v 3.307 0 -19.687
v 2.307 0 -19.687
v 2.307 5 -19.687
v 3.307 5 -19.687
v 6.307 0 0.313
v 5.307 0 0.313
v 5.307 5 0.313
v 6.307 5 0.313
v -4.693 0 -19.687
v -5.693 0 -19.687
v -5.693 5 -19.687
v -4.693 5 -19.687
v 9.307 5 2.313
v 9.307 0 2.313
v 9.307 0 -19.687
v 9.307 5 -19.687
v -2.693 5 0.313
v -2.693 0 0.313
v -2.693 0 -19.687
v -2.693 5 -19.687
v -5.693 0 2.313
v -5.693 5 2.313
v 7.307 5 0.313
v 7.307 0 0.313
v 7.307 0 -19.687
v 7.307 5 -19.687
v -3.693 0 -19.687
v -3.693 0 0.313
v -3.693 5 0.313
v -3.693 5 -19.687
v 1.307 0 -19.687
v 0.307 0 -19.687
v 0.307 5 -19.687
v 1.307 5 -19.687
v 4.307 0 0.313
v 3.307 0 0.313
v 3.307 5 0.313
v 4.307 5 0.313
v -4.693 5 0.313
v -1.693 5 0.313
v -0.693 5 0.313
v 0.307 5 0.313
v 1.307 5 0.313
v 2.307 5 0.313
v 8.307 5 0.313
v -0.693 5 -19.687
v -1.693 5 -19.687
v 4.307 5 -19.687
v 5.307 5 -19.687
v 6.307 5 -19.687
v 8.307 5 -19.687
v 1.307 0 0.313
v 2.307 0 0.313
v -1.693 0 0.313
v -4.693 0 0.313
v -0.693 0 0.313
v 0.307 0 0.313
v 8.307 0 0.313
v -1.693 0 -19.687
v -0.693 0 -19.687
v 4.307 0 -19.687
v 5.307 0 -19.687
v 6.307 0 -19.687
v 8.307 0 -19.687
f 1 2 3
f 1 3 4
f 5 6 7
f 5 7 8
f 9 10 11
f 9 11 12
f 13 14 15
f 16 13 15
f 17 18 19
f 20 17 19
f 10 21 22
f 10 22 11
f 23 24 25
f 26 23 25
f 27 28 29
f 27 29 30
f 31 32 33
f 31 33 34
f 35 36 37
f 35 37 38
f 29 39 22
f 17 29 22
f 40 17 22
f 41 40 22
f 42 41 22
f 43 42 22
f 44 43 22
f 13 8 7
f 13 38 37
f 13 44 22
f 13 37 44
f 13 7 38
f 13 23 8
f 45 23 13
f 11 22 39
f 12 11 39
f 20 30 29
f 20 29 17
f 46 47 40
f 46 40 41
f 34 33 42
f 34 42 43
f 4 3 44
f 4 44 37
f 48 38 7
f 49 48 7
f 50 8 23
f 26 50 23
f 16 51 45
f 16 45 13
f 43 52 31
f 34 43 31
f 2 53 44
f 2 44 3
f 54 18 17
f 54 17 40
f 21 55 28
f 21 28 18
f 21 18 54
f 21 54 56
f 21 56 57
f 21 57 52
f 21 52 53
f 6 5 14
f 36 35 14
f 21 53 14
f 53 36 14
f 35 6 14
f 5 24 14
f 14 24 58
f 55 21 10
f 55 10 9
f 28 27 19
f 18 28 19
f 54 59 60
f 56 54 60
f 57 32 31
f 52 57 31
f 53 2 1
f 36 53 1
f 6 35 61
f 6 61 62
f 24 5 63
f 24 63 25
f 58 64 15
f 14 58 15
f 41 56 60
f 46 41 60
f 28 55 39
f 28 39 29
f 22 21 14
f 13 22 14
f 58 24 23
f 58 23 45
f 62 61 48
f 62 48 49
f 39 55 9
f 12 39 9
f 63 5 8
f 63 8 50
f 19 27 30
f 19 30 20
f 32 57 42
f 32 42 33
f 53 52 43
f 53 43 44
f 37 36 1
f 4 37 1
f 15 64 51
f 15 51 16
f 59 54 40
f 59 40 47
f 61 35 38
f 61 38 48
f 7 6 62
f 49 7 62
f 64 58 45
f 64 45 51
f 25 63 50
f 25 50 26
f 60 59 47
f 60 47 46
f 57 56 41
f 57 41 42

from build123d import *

# Parameters (mm, degrees)
SKETCH1_W           = 15
SKETCH1_H           = 2
BOSS_EXTRUDE1_DEPTH = 5
SKETCH1_3_W         = 1
SKETCH1_3_H         = 20
BOSS_EXTRUDE2_DEPTH = 5
LPATTERN1_COUNT     = 8
LPATTERN1_PITCH     = 2


with BuildPart() as part:
    # Sketch1 → Boss-Extrude1 (new body)
    with BuildSketch(Plane(origin=(0, 0, 0), x_dir=(1, 0, 0), z_dir=(0, 1, 0))):
        with Locations((1.806666667, -1.313333333)):
            Rectangle(SKETCH1_W, SKETCH1_H)
    extrude(amount=BOSS_EXTRUDE1_DEPTH)

    # Sketch1<3> → Boss-Extrude2 (add)
    with BuildSketch(Plane(origin=(0, 0, 0), x_dir=(1, 0, 0), z_dir=(0, 1, 0))):
        with Locations((-5.193333333, 9.686666667)):
            Rectangle(SKETCH1_3_W, SKETCH1_3_H)
    boss_extrude2 = extrude(amount=BOSS_EXTRUDE2_DEPTH)

    # LPattern1: Boss-Extrude2 ×8
    with Locations(*[(i * LPATTERN1_PITCH, 0, 0) for i in range(1, LPATTERN1_COUNT)]):
        add(boss_extrude2)


solid = part.part
